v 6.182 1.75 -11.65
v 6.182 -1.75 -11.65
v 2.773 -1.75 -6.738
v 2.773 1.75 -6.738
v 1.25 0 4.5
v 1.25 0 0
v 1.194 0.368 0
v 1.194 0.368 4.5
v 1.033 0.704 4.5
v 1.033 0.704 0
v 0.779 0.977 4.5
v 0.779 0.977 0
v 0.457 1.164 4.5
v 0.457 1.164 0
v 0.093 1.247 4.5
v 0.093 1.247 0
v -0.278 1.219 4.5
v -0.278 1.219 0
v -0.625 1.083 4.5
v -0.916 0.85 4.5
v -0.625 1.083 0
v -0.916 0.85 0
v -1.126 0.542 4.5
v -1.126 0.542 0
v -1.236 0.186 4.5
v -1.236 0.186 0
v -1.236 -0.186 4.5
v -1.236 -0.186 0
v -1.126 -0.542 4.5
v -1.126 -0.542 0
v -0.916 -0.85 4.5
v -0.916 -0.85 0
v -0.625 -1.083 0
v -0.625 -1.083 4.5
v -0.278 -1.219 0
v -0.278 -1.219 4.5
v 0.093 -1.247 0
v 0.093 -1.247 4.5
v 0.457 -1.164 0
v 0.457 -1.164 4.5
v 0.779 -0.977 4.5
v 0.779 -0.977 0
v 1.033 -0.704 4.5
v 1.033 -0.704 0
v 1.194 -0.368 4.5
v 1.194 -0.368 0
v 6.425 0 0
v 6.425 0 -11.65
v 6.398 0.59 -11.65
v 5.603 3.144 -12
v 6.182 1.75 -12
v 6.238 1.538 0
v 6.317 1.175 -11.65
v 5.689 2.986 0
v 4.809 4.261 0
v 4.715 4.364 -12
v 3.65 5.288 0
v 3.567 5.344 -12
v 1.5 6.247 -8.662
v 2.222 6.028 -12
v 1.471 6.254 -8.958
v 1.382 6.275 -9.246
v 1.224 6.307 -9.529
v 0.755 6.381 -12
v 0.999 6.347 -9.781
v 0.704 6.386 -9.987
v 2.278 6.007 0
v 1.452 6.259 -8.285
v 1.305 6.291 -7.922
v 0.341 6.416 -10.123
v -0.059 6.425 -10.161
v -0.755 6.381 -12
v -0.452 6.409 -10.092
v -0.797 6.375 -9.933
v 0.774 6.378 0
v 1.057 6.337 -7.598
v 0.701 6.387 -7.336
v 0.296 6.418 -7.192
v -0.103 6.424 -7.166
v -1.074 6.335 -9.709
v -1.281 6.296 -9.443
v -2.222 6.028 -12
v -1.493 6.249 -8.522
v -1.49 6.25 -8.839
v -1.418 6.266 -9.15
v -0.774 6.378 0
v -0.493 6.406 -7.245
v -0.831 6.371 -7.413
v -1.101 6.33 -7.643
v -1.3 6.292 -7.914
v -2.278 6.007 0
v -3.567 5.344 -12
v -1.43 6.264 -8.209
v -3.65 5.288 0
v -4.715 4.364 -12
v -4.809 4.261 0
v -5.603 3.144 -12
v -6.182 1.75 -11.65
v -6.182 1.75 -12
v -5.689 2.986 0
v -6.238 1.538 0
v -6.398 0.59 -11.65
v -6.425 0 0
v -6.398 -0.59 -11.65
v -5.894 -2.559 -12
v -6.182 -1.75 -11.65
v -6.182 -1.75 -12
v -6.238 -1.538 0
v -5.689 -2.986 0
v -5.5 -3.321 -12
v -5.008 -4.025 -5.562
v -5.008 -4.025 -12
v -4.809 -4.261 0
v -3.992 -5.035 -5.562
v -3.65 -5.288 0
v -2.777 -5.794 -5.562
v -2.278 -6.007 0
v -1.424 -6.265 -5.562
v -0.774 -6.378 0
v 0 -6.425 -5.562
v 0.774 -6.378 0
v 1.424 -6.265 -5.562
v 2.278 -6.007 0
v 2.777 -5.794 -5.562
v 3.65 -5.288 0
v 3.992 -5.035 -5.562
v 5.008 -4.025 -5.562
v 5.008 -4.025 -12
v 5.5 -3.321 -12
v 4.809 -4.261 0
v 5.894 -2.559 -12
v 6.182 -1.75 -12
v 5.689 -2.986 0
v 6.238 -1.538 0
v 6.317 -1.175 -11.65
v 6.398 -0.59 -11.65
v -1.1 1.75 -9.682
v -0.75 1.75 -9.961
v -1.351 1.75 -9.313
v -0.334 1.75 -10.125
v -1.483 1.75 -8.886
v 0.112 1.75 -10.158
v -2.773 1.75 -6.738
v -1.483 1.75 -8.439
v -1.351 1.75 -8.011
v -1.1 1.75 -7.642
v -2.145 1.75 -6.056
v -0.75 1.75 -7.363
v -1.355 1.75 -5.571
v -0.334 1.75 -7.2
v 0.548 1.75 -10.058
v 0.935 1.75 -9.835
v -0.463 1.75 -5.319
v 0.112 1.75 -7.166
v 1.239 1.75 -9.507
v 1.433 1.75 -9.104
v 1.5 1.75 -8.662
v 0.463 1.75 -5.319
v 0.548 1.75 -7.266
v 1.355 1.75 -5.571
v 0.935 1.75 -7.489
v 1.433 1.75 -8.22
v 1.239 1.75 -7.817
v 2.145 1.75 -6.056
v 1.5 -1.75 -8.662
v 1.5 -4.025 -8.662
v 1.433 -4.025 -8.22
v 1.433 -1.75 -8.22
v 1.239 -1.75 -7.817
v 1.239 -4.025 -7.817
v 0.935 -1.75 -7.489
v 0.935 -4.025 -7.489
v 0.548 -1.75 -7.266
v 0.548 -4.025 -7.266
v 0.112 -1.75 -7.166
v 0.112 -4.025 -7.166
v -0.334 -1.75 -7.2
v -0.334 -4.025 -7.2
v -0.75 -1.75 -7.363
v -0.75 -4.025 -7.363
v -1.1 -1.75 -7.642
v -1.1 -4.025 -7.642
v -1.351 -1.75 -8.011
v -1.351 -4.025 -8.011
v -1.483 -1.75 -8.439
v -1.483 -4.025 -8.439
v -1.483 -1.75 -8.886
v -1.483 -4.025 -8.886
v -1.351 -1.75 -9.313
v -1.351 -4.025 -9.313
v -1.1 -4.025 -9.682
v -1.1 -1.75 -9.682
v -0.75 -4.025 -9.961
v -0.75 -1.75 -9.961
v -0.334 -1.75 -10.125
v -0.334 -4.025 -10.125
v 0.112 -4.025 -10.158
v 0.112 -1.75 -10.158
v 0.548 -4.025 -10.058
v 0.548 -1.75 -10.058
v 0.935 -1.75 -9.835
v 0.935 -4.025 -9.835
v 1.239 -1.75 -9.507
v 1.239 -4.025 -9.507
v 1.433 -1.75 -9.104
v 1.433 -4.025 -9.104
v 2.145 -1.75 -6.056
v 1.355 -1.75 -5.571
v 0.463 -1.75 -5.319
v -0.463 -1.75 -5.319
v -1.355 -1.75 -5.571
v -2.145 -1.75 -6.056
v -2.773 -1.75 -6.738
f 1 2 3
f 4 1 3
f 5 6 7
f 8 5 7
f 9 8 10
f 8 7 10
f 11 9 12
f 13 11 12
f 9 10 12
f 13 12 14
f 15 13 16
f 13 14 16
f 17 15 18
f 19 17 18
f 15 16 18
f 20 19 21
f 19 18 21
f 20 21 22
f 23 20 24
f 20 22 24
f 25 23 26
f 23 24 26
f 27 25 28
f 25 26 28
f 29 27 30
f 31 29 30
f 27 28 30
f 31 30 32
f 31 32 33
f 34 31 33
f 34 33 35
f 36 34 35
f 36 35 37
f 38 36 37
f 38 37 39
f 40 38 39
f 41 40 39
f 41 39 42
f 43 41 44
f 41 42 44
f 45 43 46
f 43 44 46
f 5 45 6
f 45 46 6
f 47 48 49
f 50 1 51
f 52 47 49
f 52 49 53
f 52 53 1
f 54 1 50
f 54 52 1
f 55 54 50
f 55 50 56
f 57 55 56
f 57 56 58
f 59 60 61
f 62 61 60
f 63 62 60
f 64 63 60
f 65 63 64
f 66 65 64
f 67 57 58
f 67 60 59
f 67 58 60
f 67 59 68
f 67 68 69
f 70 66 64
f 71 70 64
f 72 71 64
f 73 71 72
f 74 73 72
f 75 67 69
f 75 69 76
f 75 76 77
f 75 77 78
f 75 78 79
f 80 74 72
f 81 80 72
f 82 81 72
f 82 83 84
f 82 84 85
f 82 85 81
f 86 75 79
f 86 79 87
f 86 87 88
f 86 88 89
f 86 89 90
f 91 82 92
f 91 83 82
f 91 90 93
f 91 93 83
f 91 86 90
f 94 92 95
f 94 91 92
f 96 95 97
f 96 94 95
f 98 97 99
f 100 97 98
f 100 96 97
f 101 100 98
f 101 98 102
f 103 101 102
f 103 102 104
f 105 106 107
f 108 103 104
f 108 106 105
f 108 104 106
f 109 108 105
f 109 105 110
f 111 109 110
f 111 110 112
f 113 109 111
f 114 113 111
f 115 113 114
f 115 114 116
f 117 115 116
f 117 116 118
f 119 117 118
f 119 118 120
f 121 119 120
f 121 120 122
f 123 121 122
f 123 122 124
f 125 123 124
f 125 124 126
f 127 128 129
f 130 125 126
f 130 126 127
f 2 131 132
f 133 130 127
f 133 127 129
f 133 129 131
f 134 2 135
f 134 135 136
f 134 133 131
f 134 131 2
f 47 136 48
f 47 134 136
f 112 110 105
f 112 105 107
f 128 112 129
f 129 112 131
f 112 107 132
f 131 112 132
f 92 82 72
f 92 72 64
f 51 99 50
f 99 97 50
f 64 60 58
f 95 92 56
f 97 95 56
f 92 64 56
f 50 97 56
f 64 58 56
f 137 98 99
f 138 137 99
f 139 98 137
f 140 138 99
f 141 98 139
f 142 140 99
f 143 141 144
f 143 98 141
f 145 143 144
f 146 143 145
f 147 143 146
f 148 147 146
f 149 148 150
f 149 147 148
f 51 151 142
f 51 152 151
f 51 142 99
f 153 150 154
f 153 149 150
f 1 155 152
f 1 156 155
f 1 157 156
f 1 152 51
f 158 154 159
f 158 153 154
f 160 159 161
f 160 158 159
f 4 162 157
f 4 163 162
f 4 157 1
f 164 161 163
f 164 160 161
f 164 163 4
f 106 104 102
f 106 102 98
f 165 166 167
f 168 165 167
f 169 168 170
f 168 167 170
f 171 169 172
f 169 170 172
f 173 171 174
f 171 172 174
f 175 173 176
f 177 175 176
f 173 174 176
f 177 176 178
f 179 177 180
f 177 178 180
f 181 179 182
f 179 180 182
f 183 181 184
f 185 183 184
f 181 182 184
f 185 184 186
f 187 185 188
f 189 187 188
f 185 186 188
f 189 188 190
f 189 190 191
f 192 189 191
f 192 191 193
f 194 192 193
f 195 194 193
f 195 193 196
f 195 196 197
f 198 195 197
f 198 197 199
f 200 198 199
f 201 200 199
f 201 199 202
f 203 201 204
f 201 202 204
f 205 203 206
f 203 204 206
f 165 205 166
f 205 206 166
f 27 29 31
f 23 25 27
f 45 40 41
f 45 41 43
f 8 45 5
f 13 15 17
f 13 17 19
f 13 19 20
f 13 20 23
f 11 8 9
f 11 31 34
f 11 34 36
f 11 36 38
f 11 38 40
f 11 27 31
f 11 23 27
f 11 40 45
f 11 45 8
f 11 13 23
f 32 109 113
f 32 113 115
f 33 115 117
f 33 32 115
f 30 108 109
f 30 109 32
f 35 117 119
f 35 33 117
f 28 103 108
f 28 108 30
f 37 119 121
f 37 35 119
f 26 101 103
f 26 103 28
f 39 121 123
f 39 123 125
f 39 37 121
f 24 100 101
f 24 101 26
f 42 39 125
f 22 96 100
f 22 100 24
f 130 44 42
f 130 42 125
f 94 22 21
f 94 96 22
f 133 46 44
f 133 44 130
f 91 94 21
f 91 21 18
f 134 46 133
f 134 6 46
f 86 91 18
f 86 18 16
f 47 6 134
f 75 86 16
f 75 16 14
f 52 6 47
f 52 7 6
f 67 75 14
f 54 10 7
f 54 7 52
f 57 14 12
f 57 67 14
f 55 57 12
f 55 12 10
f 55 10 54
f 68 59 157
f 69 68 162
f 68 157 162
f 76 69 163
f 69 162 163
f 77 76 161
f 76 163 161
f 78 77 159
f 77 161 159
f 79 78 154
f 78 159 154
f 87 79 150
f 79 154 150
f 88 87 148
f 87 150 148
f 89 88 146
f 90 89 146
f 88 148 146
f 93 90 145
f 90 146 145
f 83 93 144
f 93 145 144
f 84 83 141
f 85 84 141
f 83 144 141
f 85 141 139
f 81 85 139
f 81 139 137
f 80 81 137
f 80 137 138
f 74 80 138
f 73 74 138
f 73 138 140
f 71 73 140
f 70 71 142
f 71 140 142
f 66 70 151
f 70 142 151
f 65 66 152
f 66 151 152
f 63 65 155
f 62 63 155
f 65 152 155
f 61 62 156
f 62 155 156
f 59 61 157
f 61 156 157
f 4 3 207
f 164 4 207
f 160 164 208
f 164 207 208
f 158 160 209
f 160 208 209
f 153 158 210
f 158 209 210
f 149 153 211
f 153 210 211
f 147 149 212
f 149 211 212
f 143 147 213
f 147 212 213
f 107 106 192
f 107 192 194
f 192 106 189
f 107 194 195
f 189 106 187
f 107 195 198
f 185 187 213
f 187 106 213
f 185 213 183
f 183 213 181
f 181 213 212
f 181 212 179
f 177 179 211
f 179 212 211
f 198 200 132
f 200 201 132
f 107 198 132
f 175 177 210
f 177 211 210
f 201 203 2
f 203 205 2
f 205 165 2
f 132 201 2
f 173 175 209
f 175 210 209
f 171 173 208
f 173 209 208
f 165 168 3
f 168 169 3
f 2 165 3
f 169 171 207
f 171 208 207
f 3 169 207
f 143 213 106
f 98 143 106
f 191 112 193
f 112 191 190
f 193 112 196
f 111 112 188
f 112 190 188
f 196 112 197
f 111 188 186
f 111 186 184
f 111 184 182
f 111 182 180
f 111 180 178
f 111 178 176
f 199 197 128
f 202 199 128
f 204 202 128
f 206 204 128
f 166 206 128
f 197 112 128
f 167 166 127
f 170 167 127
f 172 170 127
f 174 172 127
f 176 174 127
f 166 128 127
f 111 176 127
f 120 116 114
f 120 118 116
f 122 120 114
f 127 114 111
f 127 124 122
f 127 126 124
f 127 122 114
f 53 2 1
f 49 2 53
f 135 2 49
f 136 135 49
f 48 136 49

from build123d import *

# Parameters (mm, degrees)
F0_R     = 6.425
F1_DEPTH = 12
F2_R     = 1.5
F3_DEPTH = 12.5
F5_DEPTH = 1.75
F6_W     = 3.5
F6_H     = 0.3499913151
F6_W_2   = 2.4
F6_H_2   = 1.6
F6_H_3   = 3
F6_H_4   = 1.8378814235
F7_DEPTH = 12.5
F8_R     = 1.25
F9_DEPTH = 4.5


with BuildPart() as f1:
    # F0 (on Top) → F1 (new body)
    with BuildSketch(Plane.XY):
        Circle(F0_R)
    extrude(amount=-F1_DEPTH)

    # F2 (on Front) → F3 (cut, symmetric)
    with BuildSketch(Plane.XZ):
        with Locations((0, -8.6621185765)):
            Circle(F2_R)
    extrude(amount=F3_DEPTH, both=True, mode=Mode.SUBTRACT)

    # F4 (on Front) → F5 (cut, symmetric)
    with BuildSketch(Plane.XZ):
        with BuildLine():
            Line((6.425, -12), (2.7726078369, -6.7377301586))
            ThreePointArc((2.7726078369, -6.7377301586), (0, -5.2871185765), (-2.7726078369, -6.7377301586))
            Line((-2.7726078369, -6.7377301586), (-6.425, -12))
            Line((-6.425, -12), (6.425, -12))
        make_face()
    extrude(amount=F5_DEPTH, both=True, mode=Mode.SUBTRACT)

    # F6 (on Right) → F7 (cut, symmetric)
    with BuildSketch(Plane.YZ):
        with Locations((0, -11.8250043425)):
            Rectangle(F6_W, F6_H)
        with Locations((-5.225, -6.3621185765)):
            Rectangle(F6_W_2, F6_H_2)
        with Locations((-5.225, -8.6621185765)):
            Rectangle(F6_W_2, F6_H_3)
        with Locations((-5.225, -11.0810592882)):
            Rectangle(F6_W_2, F6_H_4)
    extrude(amount=F7_DEPTH, both=True, mode=Mode.SUBTRACT)

    # F8 (on face) → F9 (join)
    with BuildSketch(Plane.XY):
        Circle(F8_R)
    extrude(amount=F9_DEPTH)


solid = f1.part
